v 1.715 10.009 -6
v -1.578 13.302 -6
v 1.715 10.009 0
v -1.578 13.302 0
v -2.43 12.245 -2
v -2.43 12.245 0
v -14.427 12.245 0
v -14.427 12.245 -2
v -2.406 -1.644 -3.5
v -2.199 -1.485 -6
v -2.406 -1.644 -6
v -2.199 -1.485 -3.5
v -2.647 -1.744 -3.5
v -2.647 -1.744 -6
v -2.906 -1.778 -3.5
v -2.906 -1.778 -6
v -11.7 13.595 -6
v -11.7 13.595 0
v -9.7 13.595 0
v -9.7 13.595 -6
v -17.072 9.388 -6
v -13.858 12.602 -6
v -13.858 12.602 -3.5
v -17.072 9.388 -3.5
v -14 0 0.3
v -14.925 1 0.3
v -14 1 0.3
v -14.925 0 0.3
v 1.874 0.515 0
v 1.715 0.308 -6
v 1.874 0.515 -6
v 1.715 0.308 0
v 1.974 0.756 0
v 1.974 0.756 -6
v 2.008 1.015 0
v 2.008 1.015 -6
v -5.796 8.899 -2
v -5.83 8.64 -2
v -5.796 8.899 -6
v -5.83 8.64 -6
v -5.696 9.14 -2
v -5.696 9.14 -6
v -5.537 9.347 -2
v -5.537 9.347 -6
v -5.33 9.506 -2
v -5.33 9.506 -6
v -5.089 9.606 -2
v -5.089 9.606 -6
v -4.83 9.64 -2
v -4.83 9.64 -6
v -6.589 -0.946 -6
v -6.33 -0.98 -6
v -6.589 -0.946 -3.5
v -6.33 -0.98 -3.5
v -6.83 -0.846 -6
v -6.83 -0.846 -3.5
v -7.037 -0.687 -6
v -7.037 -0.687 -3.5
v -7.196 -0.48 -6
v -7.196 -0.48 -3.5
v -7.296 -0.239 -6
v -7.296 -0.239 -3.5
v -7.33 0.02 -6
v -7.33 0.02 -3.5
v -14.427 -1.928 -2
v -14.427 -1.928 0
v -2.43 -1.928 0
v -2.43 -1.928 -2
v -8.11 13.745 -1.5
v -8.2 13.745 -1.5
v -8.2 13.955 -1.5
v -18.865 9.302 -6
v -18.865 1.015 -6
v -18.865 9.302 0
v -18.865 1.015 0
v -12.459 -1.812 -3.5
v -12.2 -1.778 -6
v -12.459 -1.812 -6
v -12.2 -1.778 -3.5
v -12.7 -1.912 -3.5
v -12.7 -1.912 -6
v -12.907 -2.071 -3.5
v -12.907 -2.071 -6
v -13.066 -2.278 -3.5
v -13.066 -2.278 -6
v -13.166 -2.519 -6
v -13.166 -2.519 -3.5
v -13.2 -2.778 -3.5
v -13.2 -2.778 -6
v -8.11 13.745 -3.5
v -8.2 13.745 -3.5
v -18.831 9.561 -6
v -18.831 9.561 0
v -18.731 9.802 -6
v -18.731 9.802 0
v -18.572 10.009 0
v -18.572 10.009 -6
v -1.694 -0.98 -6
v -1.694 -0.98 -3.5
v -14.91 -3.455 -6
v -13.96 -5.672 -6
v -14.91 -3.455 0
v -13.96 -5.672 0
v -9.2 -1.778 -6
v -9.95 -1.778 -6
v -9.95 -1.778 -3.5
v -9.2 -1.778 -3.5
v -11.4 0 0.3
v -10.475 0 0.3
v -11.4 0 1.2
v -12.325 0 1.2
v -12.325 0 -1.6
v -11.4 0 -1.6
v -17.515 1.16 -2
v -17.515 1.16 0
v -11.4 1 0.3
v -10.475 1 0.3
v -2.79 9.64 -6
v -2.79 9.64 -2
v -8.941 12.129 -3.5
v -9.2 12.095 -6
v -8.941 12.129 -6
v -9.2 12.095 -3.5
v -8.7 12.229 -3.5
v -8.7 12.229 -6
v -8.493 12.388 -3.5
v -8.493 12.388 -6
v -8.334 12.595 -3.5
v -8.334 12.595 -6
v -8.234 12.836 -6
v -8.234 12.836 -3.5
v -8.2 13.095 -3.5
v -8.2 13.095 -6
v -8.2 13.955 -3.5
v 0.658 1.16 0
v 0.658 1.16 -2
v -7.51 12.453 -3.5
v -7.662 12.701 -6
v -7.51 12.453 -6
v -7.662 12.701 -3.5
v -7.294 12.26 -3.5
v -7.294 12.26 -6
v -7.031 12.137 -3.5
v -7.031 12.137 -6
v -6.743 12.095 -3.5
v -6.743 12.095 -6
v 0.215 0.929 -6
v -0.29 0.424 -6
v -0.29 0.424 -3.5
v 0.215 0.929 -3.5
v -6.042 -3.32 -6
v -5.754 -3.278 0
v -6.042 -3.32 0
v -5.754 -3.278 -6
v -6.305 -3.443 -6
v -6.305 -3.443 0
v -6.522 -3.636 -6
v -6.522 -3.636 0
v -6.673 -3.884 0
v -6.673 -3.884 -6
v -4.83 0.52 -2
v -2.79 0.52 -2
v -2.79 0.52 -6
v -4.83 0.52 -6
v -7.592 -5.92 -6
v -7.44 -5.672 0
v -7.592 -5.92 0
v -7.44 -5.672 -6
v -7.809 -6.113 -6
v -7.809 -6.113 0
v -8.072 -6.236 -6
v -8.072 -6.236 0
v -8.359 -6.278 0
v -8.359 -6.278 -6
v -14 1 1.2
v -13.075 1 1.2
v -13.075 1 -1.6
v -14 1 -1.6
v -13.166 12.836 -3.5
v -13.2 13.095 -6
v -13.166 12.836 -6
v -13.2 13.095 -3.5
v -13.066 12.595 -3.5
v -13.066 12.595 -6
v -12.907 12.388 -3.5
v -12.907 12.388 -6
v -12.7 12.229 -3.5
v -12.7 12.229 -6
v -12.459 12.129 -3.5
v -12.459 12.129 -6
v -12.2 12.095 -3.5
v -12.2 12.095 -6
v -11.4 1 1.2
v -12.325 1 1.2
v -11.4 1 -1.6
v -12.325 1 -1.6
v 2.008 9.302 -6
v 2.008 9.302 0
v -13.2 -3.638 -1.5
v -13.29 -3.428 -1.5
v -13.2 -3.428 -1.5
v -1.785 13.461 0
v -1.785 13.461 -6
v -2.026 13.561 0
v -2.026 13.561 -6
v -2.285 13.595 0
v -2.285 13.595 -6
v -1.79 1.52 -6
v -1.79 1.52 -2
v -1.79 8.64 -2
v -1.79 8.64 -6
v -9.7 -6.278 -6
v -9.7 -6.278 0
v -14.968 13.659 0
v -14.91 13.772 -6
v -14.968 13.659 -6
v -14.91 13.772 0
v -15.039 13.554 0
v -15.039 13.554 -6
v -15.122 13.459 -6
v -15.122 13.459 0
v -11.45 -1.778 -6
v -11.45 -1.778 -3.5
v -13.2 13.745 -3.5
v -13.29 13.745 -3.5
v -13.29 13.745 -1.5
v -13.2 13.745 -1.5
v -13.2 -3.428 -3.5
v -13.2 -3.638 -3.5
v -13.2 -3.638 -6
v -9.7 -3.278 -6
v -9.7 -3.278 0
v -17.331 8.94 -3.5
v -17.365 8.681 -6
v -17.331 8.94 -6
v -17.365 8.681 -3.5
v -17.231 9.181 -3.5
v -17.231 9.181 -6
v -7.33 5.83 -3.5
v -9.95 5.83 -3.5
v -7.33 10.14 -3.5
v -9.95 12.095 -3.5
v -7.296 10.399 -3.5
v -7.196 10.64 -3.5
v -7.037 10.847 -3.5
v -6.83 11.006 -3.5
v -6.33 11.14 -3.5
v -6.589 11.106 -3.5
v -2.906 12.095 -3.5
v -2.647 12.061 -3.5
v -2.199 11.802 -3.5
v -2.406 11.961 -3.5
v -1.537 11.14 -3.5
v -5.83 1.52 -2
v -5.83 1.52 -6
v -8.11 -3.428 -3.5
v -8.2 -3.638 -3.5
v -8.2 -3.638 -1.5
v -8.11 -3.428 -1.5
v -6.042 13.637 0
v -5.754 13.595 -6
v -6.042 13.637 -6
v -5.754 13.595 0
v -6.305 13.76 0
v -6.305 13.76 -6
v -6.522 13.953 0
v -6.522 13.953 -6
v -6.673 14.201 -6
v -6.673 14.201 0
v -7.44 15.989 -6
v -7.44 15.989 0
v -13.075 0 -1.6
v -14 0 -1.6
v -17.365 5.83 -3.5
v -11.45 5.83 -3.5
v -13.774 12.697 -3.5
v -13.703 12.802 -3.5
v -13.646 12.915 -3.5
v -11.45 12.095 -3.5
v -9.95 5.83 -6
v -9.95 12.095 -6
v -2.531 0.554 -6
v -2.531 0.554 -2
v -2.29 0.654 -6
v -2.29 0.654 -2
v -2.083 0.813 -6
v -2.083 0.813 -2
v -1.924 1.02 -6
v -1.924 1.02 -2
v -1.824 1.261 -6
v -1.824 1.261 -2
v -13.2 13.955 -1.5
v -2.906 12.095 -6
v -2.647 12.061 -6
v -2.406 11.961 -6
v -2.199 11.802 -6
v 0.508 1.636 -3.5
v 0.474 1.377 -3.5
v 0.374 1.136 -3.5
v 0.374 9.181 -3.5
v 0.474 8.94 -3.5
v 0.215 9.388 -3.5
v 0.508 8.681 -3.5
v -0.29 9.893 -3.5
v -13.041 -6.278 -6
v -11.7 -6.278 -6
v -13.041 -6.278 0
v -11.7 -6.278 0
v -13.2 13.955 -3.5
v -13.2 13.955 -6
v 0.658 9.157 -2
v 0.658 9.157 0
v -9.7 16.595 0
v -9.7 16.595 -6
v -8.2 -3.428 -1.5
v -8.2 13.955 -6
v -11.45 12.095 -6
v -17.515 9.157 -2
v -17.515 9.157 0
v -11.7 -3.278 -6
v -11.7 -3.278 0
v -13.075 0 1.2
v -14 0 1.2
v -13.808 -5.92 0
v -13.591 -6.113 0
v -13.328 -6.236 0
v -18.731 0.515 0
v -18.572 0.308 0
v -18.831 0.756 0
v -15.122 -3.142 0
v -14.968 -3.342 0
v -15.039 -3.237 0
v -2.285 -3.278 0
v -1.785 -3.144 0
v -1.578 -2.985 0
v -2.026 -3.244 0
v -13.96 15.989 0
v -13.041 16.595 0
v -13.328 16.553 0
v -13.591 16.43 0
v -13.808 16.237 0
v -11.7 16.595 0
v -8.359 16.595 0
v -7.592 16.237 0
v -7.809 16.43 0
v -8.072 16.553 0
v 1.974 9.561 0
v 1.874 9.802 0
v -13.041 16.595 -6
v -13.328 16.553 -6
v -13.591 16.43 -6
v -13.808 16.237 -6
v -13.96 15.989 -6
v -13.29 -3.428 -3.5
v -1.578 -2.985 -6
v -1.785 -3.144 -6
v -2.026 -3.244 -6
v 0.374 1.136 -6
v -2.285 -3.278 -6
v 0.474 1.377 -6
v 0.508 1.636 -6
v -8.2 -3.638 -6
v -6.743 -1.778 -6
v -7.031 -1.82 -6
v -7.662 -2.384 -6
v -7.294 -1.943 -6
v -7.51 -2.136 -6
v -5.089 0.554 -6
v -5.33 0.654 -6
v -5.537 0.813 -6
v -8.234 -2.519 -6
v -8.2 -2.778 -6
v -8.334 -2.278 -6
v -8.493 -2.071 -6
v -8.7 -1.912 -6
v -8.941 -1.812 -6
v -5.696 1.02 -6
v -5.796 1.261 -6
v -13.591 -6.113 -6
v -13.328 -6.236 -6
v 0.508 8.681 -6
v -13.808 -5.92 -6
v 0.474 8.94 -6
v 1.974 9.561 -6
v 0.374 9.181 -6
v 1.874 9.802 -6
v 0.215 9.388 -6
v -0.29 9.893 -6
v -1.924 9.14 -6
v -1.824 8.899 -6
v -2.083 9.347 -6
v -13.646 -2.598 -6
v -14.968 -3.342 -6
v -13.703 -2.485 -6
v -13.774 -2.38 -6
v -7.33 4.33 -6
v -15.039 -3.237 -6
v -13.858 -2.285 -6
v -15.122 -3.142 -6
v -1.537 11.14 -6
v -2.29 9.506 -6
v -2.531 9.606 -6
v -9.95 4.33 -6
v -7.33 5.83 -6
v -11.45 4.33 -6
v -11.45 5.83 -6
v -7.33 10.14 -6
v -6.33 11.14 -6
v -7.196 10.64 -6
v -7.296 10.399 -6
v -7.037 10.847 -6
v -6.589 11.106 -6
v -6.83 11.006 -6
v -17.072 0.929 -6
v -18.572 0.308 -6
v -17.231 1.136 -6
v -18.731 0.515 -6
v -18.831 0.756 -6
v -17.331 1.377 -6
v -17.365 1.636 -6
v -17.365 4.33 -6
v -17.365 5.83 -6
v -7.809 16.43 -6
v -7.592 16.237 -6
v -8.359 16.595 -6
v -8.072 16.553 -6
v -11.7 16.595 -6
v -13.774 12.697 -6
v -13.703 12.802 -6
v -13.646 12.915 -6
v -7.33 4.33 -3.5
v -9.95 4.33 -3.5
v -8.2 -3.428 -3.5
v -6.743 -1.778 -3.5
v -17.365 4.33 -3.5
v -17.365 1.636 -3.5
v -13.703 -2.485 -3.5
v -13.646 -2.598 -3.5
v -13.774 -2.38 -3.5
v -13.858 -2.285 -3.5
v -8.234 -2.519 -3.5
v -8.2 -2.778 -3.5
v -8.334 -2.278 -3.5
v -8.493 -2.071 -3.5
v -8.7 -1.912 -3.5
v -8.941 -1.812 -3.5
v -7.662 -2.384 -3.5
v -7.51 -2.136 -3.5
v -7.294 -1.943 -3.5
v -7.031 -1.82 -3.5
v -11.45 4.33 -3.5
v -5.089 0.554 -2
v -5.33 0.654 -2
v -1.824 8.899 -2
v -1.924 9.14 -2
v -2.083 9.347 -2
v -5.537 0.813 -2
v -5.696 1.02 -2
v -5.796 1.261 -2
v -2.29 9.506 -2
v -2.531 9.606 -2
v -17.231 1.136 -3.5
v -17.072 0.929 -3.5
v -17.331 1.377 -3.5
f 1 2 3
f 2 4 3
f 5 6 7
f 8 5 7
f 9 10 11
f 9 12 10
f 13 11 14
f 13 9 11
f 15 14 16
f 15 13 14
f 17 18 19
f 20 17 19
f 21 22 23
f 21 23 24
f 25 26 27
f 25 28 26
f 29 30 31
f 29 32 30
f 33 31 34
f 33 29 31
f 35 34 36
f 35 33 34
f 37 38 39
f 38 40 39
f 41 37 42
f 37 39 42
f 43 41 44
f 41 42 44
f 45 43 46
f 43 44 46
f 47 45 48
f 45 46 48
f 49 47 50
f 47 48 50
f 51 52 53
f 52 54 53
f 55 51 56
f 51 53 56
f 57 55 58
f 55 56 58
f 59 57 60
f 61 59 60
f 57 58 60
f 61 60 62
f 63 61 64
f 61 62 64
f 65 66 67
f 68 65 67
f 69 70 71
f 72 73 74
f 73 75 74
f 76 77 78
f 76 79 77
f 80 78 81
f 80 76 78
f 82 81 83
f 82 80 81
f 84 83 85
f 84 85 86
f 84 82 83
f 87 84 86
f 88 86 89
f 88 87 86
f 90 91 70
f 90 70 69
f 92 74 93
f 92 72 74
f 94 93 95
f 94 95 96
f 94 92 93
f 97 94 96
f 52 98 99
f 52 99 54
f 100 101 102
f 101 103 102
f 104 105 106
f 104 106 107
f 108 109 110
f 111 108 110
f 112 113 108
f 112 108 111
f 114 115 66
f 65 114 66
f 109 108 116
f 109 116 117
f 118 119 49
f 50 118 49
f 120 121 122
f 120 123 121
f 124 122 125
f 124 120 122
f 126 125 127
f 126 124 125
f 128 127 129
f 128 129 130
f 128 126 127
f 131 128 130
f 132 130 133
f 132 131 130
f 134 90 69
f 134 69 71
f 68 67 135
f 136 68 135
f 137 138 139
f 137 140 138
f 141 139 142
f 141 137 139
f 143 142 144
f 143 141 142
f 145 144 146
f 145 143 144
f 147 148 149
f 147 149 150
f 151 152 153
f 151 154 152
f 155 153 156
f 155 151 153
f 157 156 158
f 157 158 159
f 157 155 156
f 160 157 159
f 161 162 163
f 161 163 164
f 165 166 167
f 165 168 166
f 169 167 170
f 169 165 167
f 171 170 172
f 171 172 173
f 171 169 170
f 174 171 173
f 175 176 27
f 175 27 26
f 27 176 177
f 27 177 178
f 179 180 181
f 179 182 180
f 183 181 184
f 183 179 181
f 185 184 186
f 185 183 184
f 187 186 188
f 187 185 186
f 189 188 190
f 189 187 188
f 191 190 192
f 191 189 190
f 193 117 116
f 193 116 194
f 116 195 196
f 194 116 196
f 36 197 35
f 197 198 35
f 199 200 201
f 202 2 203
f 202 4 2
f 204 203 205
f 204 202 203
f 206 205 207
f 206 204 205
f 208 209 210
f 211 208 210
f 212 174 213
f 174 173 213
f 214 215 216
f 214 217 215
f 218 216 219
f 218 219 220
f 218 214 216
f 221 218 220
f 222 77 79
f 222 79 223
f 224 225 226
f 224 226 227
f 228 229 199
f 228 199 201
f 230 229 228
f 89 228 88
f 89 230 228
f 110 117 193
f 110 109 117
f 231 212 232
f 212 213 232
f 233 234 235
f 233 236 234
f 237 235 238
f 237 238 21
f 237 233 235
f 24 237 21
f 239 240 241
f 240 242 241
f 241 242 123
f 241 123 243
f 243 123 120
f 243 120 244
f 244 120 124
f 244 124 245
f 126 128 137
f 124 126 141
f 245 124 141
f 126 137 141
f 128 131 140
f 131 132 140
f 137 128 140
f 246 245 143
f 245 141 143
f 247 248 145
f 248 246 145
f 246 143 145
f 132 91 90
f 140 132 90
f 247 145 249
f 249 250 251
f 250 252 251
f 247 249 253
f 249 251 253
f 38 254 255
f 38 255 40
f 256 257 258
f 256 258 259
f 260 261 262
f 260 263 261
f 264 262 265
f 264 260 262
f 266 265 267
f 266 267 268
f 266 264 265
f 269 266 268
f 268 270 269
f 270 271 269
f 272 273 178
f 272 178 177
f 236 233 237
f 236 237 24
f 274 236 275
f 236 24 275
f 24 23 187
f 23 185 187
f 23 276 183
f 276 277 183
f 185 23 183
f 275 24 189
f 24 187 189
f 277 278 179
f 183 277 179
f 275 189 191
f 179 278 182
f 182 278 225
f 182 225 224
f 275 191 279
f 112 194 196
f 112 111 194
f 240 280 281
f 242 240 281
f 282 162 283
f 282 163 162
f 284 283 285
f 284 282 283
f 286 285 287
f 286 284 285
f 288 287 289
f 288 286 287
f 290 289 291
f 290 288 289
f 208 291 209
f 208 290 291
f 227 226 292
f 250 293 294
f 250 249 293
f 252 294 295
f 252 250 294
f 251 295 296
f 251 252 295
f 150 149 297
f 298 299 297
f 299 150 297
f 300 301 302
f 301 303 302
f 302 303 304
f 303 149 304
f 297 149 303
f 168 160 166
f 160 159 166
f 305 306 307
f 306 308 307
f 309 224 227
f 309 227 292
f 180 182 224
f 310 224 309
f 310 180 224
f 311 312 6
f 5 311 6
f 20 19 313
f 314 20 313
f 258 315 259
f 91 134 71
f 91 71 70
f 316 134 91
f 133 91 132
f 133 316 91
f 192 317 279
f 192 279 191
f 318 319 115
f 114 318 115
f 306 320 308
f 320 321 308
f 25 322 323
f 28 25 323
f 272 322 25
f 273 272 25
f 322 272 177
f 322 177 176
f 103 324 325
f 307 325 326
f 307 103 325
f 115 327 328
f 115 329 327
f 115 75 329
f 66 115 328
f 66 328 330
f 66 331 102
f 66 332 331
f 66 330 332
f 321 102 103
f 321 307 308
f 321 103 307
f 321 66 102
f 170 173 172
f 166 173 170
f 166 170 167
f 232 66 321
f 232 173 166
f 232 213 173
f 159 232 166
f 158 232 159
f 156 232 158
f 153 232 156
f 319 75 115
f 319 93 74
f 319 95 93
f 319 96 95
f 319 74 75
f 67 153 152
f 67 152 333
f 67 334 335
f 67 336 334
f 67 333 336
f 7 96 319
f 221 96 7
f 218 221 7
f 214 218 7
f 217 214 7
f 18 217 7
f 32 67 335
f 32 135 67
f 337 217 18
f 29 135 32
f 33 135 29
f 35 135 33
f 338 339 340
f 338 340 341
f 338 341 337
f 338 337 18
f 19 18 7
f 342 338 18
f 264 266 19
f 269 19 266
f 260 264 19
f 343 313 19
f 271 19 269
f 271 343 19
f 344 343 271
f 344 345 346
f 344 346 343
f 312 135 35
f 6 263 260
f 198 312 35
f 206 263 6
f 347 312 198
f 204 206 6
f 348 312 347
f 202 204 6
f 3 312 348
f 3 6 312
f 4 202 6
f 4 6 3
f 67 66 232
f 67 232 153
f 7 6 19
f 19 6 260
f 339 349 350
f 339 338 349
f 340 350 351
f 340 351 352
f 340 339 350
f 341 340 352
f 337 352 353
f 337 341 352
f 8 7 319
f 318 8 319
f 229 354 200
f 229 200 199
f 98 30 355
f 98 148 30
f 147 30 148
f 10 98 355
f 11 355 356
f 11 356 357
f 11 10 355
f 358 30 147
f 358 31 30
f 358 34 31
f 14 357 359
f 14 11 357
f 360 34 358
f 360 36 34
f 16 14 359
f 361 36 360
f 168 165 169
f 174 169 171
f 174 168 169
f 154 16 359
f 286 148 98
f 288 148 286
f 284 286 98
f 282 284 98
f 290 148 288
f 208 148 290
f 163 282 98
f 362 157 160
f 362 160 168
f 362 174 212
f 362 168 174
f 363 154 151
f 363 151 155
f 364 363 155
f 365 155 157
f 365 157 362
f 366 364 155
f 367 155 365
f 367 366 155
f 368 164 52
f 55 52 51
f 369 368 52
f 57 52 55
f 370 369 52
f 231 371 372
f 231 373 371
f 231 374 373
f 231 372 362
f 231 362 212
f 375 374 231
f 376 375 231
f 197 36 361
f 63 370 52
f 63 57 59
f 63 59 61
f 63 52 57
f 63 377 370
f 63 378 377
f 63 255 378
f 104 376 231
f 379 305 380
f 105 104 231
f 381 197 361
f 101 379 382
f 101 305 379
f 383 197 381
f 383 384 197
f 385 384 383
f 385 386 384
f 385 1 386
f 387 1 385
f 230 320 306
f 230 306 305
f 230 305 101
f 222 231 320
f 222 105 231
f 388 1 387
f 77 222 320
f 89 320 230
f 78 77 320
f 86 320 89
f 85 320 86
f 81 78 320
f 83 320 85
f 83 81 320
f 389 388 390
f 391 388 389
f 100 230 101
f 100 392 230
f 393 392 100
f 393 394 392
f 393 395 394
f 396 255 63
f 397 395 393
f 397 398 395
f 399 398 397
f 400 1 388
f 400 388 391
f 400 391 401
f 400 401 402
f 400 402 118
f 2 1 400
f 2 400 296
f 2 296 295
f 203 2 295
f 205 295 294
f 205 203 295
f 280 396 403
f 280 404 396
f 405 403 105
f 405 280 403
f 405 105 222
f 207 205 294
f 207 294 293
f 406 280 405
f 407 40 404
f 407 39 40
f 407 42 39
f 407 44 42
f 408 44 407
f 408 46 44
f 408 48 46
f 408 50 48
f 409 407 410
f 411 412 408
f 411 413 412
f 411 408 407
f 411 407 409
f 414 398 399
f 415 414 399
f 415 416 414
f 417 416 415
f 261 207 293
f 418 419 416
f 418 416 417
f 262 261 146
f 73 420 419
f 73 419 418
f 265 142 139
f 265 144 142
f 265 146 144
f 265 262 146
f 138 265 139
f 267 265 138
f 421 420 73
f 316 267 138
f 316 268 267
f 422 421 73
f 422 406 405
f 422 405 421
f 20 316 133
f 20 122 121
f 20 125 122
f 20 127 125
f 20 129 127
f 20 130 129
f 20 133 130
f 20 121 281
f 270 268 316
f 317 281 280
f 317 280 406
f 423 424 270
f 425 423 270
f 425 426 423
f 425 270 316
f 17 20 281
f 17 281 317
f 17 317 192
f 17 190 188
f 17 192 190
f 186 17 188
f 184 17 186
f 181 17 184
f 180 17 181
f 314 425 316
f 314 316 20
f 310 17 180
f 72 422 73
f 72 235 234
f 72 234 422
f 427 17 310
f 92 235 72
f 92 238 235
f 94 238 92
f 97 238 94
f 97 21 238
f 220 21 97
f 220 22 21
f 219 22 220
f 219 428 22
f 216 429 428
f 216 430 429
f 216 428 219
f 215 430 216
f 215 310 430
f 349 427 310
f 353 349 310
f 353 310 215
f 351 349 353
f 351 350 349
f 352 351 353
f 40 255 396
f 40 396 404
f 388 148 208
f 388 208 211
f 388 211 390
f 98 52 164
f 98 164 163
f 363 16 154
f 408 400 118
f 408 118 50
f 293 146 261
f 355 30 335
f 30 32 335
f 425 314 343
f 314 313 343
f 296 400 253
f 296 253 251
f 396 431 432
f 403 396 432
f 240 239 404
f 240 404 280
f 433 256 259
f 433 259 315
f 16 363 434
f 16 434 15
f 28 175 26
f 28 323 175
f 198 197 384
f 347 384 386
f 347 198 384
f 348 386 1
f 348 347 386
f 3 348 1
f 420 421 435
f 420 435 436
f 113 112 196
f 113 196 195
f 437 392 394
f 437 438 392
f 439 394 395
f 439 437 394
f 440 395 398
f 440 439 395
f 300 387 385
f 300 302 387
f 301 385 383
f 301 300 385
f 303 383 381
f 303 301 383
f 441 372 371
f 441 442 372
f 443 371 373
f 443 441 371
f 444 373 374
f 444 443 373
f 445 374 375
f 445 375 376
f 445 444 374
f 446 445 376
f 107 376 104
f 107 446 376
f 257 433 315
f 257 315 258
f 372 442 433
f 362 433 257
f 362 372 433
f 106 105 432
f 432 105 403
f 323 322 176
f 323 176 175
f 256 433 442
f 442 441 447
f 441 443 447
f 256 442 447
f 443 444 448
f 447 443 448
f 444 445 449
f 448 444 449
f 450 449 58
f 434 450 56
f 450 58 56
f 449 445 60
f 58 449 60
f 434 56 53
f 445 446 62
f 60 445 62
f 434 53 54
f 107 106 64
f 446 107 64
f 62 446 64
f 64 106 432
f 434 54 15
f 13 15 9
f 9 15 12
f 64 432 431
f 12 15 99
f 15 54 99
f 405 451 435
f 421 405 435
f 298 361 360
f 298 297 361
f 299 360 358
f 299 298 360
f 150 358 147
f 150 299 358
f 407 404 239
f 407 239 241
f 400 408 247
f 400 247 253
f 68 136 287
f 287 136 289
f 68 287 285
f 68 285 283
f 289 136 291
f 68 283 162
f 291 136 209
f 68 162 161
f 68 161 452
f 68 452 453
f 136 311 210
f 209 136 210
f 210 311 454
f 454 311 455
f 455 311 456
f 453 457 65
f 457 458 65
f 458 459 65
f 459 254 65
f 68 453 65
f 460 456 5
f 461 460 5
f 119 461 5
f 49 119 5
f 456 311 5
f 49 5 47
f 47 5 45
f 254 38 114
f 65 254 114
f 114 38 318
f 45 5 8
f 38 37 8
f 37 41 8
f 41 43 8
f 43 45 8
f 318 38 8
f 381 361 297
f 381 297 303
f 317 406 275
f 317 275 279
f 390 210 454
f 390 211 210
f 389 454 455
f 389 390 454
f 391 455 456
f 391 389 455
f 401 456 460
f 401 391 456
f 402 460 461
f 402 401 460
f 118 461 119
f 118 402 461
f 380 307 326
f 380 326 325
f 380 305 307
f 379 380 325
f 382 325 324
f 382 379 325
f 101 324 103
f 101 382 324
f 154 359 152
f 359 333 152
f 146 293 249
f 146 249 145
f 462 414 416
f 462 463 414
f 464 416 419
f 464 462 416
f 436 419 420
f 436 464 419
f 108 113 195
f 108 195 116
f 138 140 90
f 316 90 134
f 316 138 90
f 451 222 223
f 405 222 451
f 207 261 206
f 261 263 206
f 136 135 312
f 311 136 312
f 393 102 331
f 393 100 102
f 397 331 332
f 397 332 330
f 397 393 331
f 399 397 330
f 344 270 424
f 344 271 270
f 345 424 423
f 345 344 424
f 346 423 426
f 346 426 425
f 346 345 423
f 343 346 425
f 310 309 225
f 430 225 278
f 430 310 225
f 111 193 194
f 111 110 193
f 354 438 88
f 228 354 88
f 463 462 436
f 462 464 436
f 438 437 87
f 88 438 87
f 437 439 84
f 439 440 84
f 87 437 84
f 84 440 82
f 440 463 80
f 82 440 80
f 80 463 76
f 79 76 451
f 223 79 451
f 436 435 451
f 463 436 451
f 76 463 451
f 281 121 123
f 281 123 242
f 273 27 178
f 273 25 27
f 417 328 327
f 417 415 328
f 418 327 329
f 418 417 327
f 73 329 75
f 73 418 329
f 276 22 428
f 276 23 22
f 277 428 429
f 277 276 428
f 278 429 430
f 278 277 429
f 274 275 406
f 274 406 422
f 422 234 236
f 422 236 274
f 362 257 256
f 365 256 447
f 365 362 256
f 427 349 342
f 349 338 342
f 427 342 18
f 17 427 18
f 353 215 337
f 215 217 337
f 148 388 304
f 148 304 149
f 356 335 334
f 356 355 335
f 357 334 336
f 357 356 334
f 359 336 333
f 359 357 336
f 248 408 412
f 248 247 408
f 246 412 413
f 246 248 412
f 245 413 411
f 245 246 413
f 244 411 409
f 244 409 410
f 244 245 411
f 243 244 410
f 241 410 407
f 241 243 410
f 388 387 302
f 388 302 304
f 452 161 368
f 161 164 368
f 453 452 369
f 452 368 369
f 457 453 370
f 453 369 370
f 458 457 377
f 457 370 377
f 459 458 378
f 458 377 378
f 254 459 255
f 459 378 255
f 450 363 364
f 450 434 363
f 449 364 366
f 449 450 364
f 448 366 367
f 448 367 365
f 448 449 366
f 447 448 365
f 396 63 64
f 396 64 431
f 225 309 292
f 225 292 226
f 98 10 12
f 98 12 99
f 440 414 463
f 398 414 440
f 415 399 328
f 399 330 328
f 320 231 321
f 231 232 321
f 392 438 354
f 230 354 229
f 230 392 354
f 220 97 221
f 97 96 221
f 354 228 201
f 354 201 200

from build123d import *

# Parameters (mm, degrees)
BOSS_EXTRU_1_DEPTH   = 2
ESQUISSE2_W          = 4.04
ESQUISSE2_H          = 9.12
BOSS_EXTRU_2_DEPTH   = 4
BOSS_EXTRU_3_DEPTH   = 0.5
BOSS_EXTRU_3_2_DEPTH = 0.5
COQUE1_START         = -6
COQUE1_DEPTH         = 2.5
COQUE1_START_2       = -3.5
COQUE1_2_DEPTH       = 2
CONG_1_R             = 1
NERVURE1_REACH       = 28.137
ESQUISSE5_WALLS_W    = 1.5
ESQUISSE5_WALLS_H    = 68.146214938
NERVURE2_START       = -2.5
NERVURE2_OUTLINE_W   = 5.915
NERVURE2_OUTLINE_H   = 1.5
NERVURE2_OUTLINE_W_2 = 2.62
NERVURE2_DEPTH       = 2.5


# Read off the part's stored shape, not the designer's step: Coque1, Nervure2
with BuildPart() as part:
    # Esquisse1 → Boss.-Extru.1 (new body)
    with BuildSketch(Plane.XY):
        Polygon((2.008, 0.600679656), (2.008, 9.716320344), (-1.870679656, 13.595), (-6.413679656, 13.595), (-7.7, 16.595), (-9.7, 16.595), (-9.7, 13.595), (-11.7, 13.595), (-11.7, 16.595), (-13.7, 16.595), (-14.986320344, 13.595), (-18.865, 9.716320344), (-18.865, 0.600679656), (-14.986320344, -3.278), (-13.7, -6.278), (-11.7, -6.278), (-11.7, -3.278), (-9.7, -3.278), (-9.7, -6.278), (-7.7, -6.278), (-6.413679656, -3.278), (-1.870679656, -3.278), align=None)
        Polygon((0.658, 1.159867966), (0.658, 9.157132034), (-2.429867966, 12.245), (-14.427132034, 12.245), (-17.515, 9.157132034), (-17.515, 1.159867966), (-14.427132034, -1.928), (-2.429867966, -1.928), align=None, mode=Mode.SUBTRACT)
    extrude(amount=-BOSS_EXTRU_1_DEPTH)

    # Esquisse2 → Boss.-Extru.2 (add)
    with BuildSketch(Plane(origin=(0, 0, -2), x_dir=(-1, 0, 0), z_dir=(0, 0, -1))):
        Polygon((-2.008, 0.600679656), (1.870679656, -3.278), (6.413679656, -3.278), (7.7, -6.278), (9.7, -6.278), (9.7, -3.278), (11.7, -3.278), (11.7, -6.278), (13.7, -6.278), (14.986320344, -3.278), (18.865, 0.600679656), (18.865, 9.716320344), (14.986320344, 13.595), (13.7, 16.595), (11.7, 16.595), (11.7, 13.595), (9.7, 13.595), (9.7, 16.595), (7.7, 16.595), (6.413679656, 13.595), (1.870679656, 13.595), (-2.008, 9.716320344), align=None)
        with Locations((3.81, 5.08)):
            Rectangle(ESQUISSE2_W, ESQUISSE2_H, mode=Mode.SUBTRACT)
    extrude(amount=BOSS_EXTRU_2_DEPTH)

    # Coque1 outline → Coque1 (cut)
    with BuildSketch(Plane.XY.offset(COQUE1_START)):
        Polygon((-7.33, -0.98), (-7.33, 11.14), (-1.537, 11.14), (-2.492, 12.095), (-7.402590257, 12.095), (-8.2, 13.954746089), (-8.2, 12.095), (-13.2, 12.095), (-13.2, 13.954746089), (-13.721489547, 12.738510453), (-17.365, 9.095), (-17.365, 1.222), (-13.721489547, -2.421510453), (-13.2, -3.637746089), (-13.2, -1.778), (-8.2, -1.778), (-8.2, -3.637746089), (-7.402590257, -1.778), (-2.492, -1.778), (-1.694, -0.98), align=None)
        Polygon((-0.29, 9.893), (-0.29, 0.424), (0.508, 1.222), (0.508, 9.095), align=None)
    extrude(amount=COQUE1_DEPTH, mode=Mode.SUBTRACT)

    # Coque1 2 outline → Coque1 2 (cut)
    with BuildSketch(Plane.XY.offset(COQUE1_START_2)):
        Polygon((-8.2, 13.745), (-8.110066446, 13.745), (-8.2, 13.954746089), align=None)
        Polygon((-8.2, -3.637746089), (-8.110066446, -3.428), (-8.2, -3.428), align=None)
        Polygon((-13.289933554, 13.745), (-13.2, 13.745), (-13.2, 13.954746089), align=None)
        Polygon((-13.2, -3.637746089), (-13.2, -3.428), (-13.289933554, -3.428), align=None)
    extrude(amount=COQUE1_2_DEPTH, mode=Mode.SUBTRACT)

    # Congé1
    cong_1_edges = [part.edges().sort_by_distance(p)[0] for p in [
        (-1.79, 0.52, -4),
        (-5.83, 0.52, -4),
        (-5.83, 9.64, -4),
        (-1.79, 9.64, -4),
        (0.508, 1.222, -4.75),
        (0.508, 9.095, -4.75),
        (-7.33, 11.14, -4.75),
        (-7.33, -0.98, -4.75),
        (-8.2, 12.095, -4.75),
        (-13.721489547, 12.738510453, -4.75),
        (-17.365, 1.222, -4.75),
        (-13.2, -1.778, -4.75),
        (-7.402590257, -1.778, -4.75),
        (-2.492, 12.095, -4.75),
        (-2.492, -1.778, -4.75),
        (-7.402590257, 12.095, -4.75),
        (-8.2, -1.778, -4.75),
        (-13.721489547, -2.421510453, -4.75),
        (-13.2, 12.095, -4.75),
        (-17.365, 9.095, -4.75),
        (-1.870679656, -3.278, -3),
        (-6.413679656, -3.278, -3),
        (-7.7, -6.278, -3),
        (-13.7, -6.278, -3),
        (-14.986320344, -3.278, -3),
        (-18.865, 0.600679656, -3),
        (-18.865, 9.716320344, -3),
        (-14.986320344, 13.595, -3),
        (-13.7, 16.595, -3),
        (-7.7, 16.595, -3),
        (-6.413679656, 13.595, -3),
        (-1.870679656, 13.595, -3),
        (2.008, 9.716320344, -3),
        (2.008, 0.600679656, -3),
    ]]
    fillet(cong_1_edges, radius=CONG_1_R)

    # Esquisse5 walls → Nervure1 (add, up to next)
    with BuildSketch(Plane(origin=(0, 0, -6), x_dir=(-1, 0, 0), z_dir=(0, 0, -1)), mode=Mode.PRIVATE) as nervure1_sk1:
        with Locations((10.7, 5.1585)):
            Rectangle(ESQUISSE5_WALLS_W, ESQUISSE5_WALLS_H)
    nervure1_tool1 = extrude(nervure1_sk1.sketch, amount=-NERVURE1_REACH, mode=Mode.PRIVATE) - part.part
    add(nervure1_tool1.solids().sort_by_distance((-10.7, 5.1585, -6))[0])

    # Nervure2 outline → Nervure2 (add)
    with BuildSketch(Plane(origin=(0, 0, -6), x_dir=(-1, 0, 0), z_dir=(0, 0, -1)).offset(NERVURE2_START)):
        with Locations((14.4075, 5.08)):
            Rectangle(NERVURE2_OUTLINE_W, NERVURE2_OUTLINE_H)
        with Locations((8.64, 5.08)):
            Rectangle(NERVURE2_OUTLINE_W_2, NERVURE2_OUTLINE_H)
    extrude(amount=NERVURE2_DEPTH)


with BuildPart() as body_2:
    # Esquisse4 → Boss.-Extru.3 (new, symmetric)
    with BuildSketch(Plane(origin=(0, 0.5, 0), x_dir=(-1, 0, 0), z_dir=(0, -1, 0))):
        Polygon((12.325, -1.2), (12.325, 1.6), (11.4, 1.6), (11.4, -0.3), (10.475, -0.3), (11.4, -1.2), align=None)
    extrude(amount=BOSS_EXTRU_3_DEPTH, both=True)


with BuildPart() as body_3:
    # Esquisse4 → Boss.-Extru.3 2 (new, symmetric)
    with BuildSketch(Plane(origin=(0, 0.5, 0), x_dir=(-1, 0, 0), z_dir=(0, -1, 0))):
        Polygon((14, -0.3), (14, 1.6), (13.075, 1.6), (13.075, -1.2), (14, -1.2), (14.925, -0.3), align=None)
    extrude(amount=BOSS_EXTRU_3_2_DEPTH, both=True)


solid = Compound([part.part, body_2.part, body_3.part])
